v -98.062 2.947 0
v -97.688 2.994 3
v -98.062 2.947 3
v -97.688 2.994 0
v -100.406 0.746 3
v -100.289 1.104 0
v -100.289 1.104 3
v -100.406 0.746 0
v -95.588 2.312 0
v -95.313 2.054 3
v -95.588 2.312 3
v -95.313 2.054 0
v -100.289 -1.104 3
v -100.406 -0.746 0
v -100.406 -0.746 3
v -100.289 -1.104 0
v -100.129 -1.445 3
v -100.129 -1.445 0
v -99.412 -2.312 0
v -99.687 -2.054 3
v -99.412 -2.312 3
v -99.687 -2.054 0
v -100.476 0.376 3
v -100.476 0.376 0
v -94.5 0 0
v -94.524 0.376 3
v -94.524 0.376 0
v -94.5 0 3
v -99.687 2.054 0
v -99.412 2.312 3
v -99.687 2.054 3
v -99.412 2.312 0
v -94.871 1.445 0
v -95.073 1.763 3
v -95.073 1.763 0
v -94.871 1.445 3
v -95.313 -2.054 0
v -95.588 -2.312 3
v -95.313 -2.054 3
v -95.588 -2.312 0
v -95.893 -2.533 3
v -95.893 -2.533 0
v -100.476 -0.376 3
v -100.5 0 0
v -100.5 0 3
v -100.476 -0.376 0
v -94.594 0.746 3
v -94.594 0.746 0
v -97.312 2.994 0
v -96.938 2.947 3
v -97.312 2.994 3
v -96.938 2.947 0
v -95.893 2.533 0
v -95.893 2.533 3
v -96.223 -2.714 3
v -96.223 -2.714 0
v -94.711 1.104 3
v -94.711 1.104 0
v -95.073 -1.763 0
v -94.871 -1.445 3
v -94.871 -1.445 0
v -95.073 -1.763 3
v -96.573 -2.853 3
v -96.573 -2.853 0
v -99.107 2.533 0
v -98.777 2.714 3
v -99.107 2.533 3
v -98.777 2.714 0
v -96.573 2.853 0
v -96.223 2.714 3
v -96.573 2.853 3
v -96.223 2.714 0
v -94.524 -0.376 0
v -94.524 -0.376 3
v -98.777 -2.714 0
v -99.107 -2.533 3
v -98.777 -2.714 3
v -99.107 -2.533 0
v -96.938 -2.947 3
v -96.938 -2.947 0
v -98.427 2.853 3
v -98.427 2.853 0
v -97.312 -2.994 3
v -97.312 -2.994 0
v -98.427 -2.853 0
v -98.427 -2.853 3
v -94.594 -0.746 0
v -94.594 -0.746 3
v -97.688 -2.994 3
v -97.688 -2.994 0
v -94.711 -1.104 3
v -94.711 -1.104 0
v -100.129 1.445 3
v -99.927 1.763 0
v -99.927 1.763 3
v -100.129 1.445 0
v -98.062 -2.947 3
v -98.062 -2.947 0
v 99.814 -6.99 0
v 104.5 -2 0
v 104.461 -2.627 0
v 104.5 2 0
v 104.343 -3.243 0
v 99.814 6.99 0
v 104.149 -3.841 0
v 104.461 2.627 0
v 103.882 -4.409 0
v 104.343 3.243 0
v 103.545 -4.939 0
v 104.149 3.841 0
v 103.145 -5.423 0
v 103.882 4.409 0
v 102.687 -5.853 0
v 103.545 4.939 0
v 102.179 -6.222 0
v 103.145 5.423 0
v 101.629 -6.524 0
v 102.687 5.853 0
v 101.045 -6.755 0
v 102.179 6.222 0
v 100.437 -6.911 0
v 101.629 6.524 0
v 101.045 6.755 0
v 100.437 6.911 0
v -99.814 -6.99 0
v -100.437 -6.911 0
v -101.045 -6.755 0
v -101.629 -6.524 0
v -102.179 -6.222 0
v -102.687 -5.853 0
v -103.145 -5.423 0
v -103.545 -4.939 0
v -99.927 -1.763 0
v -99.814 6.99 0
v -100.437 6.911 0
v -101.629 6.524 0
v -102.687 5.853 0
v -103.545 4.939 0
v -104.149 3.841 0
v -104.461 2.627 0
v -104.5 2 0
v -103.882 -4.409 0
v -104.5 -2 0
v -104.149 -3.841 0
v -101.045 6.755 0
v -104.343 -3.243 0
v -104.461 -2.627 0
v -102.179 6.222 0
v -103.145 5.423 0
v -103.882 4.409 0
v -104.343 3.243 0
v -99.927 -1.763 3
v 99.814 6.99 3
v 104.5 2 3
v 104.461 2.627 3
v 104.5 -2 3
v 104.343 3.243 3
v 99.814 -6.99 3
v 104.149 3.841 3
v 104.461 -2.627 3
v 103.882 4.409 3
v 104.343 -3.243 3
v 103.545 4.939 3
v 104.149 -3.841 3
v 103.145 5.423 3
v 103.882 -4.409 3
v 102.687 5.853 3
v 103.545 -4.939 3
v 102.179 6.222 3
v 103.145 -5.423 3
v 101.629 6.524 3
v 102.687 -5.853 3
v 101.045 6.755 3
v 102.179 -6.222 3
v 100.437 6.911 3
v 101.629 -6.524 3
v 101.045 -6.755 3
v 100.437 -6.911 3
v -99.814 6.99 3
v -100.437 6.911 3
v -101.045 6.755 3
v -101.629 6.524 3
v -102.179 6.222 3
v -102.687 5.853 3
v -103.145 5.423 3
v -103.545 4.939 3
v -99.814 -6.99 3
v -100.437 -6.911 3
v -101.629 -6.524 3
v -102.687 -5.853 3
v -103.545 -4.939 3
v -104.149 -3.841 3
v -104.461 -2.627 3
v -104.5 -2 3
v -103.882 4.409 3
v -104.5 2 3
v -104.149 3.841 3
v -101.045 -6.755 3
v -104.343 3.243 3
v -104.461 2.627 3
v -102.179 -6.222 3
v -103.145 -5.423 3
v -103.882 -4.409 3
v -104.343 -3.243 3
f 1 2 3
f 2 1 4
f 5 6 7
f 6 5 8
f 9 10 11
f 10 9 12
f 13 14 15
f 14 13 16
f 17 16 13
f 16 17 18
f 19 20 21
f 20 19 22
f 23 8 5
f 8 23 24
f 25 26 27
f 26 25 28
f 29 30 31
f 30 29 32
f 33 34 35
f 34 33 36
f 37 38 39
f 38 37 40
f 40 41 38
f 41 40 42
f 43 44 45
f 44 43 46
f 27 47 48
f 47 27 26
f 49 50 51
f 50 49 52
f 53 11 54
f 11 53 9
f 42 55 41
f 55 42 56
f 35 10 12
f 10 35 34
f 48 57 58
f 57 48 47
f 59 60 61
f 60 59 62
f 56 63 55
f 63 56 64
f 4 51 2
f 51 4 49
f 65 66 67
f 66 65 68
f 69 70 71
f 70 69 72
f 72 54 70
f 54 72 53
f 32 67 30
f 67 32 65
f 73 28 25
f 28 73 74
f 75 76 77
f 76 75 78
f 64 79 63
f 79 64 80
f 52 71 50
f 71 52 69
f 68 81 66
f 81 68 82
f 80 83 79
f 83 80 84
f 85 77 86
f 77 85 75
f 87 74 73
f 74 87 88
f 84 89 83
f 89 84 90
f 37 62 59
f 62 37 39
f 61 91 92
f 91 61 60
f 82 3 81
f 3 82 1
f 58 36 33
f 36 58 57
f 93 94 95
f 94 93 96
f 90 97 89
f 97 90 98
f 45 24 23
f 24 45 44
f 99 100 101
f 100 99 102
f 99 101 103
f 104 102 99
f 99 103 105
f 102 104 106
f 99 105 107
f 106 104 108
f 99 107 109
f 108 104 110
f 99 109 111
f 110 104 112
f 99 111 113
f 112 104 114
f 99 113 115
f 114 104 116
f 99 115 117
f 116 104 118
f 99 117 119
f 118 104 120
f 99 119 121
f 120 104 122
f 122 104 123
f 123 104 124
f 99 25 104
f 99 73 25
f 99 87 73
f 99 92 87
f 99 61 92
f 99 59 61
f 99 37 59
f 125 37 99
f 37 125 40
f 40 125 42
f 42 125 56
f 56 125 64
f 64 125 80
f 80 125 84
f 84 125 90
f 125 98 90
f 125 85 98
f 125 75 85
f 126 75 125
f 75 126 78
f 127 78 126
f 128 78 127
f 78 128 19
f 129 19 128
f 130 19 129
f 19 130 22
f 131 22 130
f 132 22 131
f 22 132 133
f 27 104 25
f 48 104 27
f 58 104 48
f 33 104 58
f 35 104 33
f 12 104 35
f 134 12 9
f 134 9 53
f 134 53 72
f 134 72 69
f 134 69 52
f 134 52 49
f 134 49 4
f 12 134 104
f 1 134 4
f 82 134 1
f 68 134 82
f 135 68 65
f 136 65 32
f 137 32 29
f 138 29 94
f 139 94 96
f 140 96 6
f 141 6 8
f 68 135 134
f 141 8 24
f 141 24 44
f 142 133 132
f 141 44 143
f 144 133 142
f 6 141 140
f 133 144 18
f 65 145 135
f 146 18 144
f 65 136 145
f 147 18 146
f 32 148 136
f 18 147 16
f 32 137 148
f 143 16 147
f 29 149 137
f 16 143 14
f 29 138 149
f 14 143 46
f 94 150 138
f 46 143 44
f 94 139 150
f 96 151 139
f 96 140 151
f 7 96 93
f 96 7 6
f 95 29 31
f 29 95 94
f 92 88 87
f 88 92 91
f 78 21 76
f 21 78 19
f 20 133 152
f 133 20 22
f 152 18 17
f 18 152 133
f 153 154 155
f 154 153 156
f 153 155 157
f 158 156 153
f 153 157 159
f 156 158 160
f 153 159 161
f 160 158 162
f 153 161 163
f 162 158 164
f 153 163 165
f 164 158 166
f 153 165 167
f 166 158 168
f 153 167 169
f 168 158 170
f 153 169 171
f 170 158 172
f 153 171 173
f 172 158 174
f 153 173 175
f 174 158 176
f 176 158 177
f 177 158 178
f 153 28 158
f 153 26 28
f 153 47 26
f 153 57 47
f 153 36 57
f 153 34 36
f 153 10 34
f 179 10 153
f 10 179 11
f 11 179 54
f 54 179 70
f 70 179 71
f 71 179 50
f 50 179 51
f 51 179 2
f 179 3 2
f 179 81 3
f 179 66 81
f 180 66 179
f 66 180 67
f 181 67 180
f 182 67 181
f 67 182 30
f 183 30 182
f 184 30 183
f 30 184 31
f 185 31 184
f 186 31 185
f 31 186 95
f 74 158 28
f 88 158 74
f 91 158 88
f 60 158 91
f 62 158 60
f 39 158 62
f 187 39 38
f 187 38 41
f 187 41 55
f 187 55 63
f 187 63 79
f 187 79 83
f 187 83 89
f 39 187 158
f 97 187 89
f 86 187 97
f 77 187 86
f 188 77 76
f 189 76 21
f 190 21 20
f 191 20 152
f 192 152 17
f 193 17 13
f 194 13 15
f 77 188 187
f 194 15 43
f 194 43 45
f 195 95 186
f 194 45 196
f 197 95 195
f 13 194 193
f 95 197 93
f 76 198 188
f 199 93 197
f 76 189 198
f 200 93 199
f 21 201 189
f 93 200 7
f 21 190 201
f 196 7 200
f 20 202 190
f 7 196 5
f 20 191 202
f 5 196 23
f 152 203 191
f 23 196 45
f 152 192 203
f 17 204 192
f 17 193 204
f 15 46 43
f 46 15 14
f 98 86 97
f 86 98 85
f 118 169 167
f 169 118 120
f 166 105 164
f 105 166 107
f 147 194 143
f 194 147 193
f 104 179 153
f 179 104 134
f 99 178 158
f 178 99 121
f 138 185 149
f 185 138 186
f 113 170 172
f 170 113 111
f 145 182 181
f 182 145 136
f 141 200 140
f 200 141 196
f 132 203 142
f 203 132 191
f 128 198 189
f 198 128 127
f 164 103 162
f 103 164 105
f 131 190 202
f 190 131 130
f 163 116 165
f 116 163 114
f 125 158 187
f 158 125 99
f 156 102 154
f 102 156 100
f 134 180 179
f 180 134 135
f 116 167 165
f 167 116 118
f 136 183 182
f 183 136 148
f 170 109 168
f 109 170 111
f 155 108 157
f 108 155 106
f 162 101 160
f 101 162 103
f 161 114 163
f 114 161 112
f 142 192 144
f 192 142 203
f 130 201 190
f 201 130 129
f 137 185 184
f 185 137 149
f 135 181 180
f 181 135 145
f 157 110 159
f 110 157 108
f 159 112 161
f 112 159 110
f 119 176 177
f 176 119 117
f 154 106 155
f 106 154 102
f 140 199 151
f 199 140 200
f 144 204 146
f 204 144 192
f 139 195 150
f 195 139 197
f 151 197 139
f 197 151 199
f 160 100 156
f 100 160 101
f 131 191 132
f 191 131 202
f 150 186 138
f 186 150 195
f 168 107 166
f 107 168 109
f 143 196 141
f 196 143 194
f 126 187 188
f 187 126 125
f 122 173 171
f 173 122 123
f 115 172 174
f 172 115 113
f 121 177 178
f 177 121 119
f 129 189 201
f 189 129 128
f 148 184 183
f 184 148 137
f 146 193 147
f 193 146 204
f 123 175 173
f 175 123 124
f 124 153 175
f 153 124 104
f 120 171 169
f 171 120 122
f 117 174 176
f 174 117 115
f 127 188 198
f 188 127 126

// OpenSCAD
$fn = 50;


difference() {
	union() {
		hull() {
			translate(v = [-99.5000000000, 2.0000000000, 0]) {
				cylinder(h = 3, r = 5);
			}
			translate(v = [99.5000000000, 2.0000000000, 0]) {
				cylinder(h = 3, r = 5);
			}
			translate(v = [-99.5000000000, -2.0000000000, 0]) {
				cylinder(h = 3, r = 5);
			}
			translate(v = [99.5000000000, -2.0000000000, 0]) {
				cylinder(h = 3, r = 5);
			}
		}
	}
	union() {
		translate(v = [-97.5000000000, 0.0000000000, 0]) {
			cylinder(h = 3, r = 3.0000000000);
		}
		translate(v = [-97.5000000000, 0.0000000000, 0]) {
			cylinder(h = 3, r = 1.5000000000);
		}
		translate(v = [-97.5000000000, 0.0000000000, 0]) {
			cylinder(h = 3, r = 1.5000000000);
		}
		translate(v = [-97.5000000000, 0.0000000000, 0]) {
			cylinder(h = 3, r = 1.5000000000);
		}
	}
}
